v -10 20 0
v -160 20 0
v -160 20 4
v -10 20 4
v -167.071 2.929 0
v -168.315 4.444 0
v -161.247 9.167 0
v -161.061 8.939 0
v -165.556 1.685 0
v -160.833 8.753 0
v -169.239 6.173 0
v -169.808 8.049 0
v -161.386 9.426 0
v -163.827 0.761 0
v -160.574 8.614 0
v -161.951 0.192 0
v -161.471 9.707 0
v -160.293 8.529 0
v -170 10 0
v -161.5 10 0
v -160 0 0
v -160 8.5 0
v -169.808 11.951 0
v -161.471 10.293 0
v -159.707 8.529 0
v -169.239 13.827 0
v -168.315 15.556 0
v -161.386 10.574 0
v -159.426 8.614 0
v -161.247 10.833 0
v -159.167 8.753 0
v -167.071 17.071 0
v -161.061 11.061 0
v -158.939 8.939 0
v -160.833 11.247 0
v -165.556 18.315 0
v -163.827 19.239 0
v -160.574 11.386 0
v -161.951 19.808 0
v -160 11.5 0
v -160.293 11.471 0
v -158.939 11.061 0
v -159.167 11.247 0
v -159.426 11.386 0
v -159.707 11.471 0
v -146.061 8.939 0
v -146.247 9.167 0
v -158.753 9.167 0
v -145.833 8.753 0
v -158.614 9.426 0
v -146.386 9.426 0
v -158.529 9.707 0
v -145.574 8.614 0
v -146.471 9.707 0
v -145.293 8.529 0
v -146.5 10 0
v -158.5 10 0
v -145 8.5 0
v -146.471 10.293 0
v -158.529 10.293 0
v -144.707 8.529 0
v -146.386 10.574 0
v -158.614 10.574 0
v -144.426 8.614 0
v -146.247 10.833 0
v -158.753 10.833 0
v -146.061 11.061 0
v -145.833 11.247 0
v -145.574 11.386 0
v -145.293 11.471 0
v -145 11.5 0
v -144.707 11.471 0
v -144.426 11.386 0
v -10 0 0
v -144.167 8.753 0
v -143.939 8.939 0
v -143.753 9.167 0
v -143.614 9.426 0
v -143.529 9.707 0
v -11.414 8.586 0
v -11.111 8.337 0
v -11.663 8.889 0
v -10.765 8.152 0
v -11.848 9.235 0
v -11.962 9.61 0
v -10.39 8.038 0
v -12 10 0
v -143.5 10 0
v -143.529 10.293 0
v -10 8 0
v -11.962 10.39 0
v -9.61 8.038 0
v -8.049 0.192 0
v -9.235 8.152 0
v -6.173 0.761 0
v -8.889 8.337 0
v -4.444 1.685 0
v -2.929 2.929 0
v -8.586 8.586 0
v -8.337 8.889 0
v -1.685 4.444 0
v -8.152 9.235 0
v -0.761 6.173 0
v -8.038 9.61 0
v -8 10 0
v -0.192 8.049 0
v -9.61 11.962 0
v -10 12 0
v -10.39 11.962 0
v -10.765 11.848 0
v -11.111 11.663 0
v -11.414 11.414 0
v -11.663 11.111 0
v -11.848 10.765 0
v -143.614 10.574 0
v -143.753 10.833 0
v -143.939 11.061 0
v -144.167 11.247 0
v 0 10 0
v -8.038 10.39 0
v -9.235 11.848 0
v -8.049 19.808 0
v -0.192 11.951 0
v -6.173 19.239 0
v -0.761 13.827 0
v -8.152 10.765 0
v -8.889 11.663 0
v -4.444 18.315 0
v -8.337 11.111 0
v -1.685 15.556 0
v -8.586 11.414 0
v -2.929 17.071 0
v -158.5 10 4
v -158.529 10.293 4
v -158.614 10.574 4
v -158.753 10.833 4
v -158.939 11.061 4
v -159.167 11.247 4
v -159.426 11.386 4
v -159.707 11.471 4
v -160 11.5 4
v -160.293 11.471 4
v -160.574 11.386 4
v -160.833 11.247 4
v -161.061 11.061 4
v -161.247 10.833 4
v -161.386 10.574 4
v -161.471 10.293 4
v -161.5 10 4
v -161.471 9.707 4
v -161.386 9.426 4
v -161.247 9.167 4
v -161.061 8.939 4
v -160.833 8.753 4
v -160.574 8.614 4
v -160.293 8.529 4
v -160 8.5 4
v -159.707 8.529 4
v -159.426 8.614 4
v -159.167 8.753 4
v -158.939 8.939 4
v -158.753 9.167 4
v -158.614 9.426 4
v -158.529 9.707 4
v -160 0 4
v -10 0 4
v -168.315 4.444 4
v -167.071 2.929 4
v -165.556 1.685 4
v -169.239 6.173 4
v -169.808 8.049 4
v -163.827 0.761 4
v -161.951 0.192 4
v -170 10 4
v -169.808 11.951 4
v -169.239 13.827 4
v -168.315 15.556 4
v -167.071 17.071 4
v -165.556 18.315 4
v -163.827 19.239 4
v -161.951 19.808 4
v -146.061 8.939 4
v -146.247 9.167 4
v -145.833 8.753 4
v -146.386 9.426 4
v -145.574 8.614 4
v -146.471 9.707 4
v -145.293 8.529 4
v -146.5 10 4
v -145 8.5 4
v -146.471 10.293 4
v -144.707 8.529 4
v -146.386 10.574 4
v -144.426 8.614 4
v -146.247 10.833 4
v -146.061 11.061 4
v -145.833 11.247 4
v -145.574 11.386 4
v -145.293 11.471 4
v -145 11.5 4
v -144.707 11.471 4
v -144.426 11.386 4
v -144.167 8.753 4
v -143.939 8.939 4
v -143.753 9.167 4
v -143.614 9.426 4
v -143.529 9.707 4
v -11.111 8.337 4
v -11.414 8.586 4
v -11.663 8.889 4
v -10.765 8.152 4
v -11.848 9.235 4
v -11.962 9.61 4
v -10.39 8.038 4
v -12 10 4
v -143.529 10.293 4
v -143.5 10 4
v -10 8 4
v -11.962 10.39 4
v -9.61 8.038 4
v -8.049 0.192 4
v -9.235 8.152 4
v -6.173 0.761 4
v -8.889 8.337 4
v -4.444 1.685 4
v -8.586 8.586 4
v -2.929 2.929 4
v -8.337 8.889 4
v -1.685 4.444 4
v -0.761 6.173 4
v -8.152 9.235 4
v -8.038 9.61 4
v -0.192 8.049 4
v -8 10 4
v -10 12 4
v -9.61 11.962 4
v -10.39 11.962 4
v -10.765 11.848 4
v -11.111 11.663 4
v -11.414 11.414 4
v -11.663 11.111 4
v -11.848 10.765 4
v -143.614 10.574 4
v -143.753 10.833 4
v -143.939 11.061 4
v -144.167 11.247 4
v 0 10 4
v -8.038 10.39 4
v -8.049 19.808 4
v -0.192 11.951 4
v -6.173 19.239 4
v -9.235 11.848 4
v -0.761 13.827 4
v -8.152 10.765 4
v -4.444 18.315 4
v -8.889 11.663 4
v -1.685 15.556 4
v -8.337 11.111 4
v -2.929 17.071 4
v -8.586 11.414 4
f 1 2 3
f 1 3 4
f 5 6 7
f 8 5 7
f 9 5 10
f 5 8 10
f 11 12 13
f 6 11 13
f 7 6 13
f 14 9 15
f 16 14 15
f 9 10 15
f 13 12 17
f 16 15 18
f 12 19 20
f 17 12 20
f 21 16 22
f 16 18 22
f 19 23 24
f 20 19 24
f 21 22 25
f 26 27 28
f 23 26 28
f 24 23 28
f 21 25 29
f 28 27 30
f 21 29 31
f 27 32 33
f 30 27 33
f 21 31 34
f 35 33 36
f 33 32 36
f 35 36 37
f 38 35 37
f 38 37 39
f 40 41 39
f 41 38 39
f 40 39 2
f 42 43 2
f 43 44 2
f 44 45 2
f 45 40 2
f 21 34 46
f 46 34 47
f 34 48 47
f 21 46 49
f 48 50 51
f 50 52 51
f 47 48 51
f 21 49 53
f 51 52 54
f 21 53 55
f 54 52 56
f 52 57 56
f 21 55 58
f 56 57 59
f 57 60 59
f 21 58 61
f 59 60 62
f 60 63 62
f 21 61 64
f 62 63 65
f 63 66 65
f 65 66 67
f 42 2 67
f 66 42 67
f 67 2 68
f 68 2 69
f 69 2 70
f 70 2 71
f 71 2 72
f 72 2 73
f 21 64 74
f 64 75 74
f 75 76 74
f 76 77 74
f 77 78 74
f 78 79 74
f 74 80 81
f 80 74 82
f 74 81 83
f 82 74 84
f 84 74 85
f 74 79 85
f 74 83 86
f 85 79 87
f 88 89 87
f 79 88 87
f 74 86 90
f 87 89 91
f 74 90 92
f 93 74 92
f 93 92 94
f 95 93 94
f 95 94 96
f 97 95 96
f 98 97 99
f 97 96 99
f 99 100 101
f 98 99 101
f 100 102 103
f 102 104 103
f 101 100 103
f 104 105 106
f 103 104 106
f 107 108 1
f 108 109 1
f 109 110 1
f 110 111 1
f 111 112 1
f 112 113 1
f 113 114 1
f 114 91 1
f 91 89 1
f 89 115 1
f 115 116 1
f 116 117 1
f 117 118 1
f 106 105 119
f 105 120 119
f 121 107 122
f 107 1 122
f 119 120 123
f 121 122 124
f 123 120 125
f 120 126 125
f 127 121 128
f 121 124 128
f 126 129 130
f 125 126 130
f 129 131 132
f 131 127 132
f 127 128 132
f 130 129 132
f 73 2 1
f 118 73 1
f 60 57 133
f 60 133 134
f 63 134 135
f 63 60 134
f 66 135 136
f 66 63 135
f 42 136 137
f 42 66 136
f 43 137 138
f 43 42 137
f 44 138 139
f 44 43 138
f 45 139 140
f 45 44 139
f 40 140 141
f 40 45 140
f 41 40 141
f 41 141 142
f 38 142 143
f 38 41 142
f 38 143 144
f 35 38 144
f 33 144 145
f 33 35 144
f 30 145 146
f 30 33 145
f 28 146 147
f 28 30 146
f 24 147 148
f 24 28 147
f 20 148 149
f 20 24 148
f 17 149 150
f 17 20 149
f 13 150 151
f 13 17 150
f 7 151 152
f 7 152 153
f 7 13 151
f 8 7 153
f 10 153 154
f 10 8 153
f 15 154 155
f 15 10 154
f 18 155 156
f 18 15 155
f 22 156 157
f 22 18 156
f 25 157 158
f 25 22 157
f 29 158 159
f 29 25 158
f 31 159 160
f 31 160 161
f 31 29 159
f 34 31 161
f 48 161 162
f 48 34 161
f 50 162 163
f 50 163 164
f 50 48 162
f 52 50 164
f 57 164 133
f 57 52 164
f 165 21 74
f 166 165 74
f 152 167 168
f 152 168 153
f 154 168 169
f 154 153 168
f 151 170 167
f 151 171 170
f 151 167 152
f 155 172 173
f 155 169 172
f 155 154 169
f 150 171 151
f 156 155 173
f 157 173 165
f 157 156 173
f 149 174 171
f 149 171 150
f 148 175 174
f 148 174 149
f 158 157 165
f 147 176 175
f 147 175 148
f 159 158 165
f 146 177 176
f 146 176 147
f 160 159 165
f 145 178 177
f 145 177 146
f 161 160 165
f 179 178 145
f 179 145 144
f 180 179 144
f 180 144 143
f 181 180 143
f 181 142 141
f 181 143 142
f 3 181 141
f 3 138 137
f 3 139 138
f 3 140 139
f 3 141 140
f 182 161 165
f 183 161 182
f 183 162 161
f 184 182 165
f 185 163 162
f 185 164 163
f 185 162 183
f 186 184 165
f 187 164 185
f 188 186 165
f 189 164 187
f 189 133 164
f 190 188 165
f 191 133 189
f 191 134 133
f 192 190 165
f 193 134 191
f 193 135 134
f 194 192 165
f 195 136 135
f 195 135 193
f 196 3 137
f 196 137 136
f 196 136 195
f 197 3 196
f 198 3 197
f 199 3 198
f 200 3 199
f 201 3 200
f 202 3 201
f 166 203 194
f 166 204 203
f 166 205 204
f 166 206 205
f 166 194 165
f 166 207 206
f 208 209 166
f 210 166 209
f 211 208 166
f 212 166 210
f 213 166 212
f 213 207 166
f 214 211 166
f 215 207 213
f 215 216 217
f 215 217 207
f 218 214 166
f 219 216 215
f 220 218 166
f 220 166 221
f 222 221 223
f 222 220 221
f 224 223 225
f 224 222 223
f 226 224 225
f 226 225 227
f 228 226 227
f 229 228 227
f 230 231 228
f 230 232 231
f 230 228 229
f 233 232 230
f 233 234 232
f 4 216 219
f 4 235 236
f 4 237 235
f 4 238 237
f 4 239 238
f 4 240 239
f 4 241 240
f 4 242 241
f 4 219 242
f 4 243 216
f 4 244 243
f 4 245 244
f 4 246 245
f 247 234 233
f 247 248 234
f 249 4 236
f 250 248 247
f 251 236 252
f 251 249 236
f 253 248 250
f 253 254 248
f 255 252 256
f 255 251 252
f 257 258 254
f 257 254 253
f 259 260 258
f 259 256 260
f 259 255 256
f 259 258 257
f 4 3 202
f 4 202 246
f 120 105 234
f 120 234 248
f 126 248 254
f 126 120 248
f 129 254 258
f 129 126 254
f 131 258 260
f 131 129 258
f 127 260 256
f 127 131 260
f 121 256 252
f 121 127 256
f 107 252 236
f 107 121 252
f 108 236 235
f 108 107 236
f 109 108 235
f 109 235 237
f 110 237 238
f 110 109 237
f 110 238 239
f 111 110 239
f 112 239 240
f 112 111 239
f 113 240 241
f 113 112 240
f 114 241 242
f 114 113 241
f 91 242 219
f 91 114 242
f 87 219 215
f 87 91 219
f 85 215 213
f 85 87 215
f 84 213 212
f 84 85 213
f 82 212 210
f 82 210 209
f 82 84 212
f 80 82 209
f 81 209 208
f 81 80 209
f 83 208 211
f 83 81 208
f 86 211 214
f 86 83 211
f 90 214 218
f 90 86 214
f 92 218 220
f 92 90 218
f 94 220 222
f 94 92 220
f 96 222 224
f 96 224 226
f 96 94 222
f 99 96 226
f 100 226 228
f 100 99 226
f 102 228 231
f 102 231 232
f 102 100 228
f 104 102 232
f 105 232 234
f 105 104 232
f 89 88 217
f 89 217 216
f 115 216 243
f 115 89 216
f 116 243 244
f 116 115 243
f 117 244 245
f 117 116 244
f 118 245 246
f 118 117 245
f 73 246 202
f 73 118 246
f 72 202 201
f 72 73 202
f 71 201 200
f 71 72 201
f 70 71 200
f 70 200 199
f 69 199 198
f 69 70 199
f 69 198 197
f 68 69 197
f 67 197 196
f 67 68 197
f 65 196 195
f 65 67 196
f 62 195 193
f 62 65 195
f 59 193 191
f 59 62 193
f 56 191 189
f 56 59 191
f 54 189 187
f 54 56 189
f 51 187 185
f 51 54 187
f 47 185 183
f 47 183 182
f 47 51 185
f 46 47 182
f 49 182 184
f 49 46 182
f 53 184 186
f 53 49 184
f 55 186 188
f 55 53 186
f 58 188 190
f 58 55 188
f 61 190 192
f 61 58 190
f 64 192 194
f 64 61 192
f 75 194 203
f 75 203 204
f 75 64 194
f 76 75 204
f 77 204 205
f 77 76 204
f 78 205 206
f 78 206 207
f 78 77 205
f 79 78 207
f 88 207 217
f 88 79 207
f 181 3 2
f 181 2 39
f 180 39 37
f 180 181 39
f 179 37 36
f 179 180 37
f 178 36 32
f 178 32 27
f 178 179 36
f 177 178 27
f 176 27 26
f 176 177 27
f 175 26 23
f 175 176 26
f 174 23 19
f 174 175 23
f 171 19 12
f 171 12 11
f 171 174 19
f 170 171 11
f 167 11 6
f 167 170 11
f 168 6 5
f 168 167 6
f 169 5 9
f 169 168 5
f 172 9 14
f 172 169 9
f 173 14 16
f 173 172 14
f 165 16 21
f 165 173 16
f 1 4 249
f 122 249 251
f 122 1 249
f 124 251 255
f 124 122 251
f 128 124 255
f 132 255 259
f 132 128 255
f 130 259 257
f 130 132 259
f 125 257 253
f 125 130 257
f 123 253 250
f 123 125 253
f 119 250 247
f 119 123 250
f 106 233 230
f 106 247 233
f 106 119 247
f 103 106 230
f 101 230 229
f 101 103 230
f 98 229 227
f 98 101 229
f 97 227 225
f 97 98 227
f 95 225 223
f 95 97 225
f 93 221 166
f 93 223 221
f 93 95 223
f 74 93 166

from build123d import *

# Parameters (mm, degrees)
ESQUISSE1_W        = 170
ESQUISSE1_H        = 20
ESQUISSE1_R        = 1.5
ESQUISSE1_R_2      = 2
BOSS_EXTRU_1_DEPTH = 4
CONG_1_RADIUS      = 10
CONG_1_LENGTH      = 4
CONG_2_RADIUS      = 10
CONG_2_LENGTH      = 4


with BuildPart() as part:
    # Esquisse1 → Boss.-Extru.1 (new body)
    with BuildSketch(Plane.XY):
        with Locations((-85, 10)):
            Rectangle(ESQUISSE1_W, ESQUISSE1_H)
        with Locations((-160, 10)):
            Circle(ESQUISSE1_R, mode=Mode.SUBTRACT)
        with Locations((-10, 10)):
            Circle(ESQUISSE1_R_2, mode=Mode.SUBTRACT)
        with Locations((-145, 10)):
            Circle(ESQUISSE1_R, mode=Mode.SUBTRACT)
    extrude(amount=BOSS_EXTRU_1_DEPTH)

    # Congé1: full round fillet: the end face becomes a half cylinder, R = half its width
    cong_1_face = Plane((-170, 10, 2), x_dir=(0, 0, 1), z_dir=(-1, 0, 0))  # on the end face: x along it, z out of the body
    cong_1_slab = cong_1_face.offset(-CONG_1_RADIUS / 2) * Box(CONG_1_LENGTH, 2 * CONG_1_RADIUS, CONG_1_RADIUS, mode=Mode.PRIVATE)  # the body's end, R deep
    cong_1_round = Plane((-160, 10, 2), x_dir=(-1, 0, 0), z_dir=(0, 0, 1)) * Cylinder(CONG_1_RADIUS, CONG_1_LENGTH, mode=Mode.PRIVATE)  # its axis R under the face
    add(cong_1_slab - cong_1_round, mode=Mode.SUBTRACT)

    # Congé2: full round fillet: the end face becomes a half cylinder, R = half its width
    cong_2_face = Plane((0, 10, 2), x_dir=(0, 0, -1), z_dir=(1, 0, 0))  # on the end face: x along it, z out of the body
    cong_2_slab = cong_2_face.offset(-CONG_2_RADIUS / 2) * Box(CONG_2_LENGTH, 2 * CONG_2_RADIUS, CONG_2_RADIUS, mode=Mode.PRIVATE)  # the body's end, R deep
    cong_2_round = Plane((-10, 10, 2), x_dir=(1, 0, 0), z_dir=(0, 0, -1)) * Cylinder(CONG_2_RADIUS, CONG_2_LENGTH, mode=Mode.PRIVATE)  # its axis R under the face
    add(cong_2_slab - cong_2_round, mode=Mode.SUBTRACT)


solid = part.part
